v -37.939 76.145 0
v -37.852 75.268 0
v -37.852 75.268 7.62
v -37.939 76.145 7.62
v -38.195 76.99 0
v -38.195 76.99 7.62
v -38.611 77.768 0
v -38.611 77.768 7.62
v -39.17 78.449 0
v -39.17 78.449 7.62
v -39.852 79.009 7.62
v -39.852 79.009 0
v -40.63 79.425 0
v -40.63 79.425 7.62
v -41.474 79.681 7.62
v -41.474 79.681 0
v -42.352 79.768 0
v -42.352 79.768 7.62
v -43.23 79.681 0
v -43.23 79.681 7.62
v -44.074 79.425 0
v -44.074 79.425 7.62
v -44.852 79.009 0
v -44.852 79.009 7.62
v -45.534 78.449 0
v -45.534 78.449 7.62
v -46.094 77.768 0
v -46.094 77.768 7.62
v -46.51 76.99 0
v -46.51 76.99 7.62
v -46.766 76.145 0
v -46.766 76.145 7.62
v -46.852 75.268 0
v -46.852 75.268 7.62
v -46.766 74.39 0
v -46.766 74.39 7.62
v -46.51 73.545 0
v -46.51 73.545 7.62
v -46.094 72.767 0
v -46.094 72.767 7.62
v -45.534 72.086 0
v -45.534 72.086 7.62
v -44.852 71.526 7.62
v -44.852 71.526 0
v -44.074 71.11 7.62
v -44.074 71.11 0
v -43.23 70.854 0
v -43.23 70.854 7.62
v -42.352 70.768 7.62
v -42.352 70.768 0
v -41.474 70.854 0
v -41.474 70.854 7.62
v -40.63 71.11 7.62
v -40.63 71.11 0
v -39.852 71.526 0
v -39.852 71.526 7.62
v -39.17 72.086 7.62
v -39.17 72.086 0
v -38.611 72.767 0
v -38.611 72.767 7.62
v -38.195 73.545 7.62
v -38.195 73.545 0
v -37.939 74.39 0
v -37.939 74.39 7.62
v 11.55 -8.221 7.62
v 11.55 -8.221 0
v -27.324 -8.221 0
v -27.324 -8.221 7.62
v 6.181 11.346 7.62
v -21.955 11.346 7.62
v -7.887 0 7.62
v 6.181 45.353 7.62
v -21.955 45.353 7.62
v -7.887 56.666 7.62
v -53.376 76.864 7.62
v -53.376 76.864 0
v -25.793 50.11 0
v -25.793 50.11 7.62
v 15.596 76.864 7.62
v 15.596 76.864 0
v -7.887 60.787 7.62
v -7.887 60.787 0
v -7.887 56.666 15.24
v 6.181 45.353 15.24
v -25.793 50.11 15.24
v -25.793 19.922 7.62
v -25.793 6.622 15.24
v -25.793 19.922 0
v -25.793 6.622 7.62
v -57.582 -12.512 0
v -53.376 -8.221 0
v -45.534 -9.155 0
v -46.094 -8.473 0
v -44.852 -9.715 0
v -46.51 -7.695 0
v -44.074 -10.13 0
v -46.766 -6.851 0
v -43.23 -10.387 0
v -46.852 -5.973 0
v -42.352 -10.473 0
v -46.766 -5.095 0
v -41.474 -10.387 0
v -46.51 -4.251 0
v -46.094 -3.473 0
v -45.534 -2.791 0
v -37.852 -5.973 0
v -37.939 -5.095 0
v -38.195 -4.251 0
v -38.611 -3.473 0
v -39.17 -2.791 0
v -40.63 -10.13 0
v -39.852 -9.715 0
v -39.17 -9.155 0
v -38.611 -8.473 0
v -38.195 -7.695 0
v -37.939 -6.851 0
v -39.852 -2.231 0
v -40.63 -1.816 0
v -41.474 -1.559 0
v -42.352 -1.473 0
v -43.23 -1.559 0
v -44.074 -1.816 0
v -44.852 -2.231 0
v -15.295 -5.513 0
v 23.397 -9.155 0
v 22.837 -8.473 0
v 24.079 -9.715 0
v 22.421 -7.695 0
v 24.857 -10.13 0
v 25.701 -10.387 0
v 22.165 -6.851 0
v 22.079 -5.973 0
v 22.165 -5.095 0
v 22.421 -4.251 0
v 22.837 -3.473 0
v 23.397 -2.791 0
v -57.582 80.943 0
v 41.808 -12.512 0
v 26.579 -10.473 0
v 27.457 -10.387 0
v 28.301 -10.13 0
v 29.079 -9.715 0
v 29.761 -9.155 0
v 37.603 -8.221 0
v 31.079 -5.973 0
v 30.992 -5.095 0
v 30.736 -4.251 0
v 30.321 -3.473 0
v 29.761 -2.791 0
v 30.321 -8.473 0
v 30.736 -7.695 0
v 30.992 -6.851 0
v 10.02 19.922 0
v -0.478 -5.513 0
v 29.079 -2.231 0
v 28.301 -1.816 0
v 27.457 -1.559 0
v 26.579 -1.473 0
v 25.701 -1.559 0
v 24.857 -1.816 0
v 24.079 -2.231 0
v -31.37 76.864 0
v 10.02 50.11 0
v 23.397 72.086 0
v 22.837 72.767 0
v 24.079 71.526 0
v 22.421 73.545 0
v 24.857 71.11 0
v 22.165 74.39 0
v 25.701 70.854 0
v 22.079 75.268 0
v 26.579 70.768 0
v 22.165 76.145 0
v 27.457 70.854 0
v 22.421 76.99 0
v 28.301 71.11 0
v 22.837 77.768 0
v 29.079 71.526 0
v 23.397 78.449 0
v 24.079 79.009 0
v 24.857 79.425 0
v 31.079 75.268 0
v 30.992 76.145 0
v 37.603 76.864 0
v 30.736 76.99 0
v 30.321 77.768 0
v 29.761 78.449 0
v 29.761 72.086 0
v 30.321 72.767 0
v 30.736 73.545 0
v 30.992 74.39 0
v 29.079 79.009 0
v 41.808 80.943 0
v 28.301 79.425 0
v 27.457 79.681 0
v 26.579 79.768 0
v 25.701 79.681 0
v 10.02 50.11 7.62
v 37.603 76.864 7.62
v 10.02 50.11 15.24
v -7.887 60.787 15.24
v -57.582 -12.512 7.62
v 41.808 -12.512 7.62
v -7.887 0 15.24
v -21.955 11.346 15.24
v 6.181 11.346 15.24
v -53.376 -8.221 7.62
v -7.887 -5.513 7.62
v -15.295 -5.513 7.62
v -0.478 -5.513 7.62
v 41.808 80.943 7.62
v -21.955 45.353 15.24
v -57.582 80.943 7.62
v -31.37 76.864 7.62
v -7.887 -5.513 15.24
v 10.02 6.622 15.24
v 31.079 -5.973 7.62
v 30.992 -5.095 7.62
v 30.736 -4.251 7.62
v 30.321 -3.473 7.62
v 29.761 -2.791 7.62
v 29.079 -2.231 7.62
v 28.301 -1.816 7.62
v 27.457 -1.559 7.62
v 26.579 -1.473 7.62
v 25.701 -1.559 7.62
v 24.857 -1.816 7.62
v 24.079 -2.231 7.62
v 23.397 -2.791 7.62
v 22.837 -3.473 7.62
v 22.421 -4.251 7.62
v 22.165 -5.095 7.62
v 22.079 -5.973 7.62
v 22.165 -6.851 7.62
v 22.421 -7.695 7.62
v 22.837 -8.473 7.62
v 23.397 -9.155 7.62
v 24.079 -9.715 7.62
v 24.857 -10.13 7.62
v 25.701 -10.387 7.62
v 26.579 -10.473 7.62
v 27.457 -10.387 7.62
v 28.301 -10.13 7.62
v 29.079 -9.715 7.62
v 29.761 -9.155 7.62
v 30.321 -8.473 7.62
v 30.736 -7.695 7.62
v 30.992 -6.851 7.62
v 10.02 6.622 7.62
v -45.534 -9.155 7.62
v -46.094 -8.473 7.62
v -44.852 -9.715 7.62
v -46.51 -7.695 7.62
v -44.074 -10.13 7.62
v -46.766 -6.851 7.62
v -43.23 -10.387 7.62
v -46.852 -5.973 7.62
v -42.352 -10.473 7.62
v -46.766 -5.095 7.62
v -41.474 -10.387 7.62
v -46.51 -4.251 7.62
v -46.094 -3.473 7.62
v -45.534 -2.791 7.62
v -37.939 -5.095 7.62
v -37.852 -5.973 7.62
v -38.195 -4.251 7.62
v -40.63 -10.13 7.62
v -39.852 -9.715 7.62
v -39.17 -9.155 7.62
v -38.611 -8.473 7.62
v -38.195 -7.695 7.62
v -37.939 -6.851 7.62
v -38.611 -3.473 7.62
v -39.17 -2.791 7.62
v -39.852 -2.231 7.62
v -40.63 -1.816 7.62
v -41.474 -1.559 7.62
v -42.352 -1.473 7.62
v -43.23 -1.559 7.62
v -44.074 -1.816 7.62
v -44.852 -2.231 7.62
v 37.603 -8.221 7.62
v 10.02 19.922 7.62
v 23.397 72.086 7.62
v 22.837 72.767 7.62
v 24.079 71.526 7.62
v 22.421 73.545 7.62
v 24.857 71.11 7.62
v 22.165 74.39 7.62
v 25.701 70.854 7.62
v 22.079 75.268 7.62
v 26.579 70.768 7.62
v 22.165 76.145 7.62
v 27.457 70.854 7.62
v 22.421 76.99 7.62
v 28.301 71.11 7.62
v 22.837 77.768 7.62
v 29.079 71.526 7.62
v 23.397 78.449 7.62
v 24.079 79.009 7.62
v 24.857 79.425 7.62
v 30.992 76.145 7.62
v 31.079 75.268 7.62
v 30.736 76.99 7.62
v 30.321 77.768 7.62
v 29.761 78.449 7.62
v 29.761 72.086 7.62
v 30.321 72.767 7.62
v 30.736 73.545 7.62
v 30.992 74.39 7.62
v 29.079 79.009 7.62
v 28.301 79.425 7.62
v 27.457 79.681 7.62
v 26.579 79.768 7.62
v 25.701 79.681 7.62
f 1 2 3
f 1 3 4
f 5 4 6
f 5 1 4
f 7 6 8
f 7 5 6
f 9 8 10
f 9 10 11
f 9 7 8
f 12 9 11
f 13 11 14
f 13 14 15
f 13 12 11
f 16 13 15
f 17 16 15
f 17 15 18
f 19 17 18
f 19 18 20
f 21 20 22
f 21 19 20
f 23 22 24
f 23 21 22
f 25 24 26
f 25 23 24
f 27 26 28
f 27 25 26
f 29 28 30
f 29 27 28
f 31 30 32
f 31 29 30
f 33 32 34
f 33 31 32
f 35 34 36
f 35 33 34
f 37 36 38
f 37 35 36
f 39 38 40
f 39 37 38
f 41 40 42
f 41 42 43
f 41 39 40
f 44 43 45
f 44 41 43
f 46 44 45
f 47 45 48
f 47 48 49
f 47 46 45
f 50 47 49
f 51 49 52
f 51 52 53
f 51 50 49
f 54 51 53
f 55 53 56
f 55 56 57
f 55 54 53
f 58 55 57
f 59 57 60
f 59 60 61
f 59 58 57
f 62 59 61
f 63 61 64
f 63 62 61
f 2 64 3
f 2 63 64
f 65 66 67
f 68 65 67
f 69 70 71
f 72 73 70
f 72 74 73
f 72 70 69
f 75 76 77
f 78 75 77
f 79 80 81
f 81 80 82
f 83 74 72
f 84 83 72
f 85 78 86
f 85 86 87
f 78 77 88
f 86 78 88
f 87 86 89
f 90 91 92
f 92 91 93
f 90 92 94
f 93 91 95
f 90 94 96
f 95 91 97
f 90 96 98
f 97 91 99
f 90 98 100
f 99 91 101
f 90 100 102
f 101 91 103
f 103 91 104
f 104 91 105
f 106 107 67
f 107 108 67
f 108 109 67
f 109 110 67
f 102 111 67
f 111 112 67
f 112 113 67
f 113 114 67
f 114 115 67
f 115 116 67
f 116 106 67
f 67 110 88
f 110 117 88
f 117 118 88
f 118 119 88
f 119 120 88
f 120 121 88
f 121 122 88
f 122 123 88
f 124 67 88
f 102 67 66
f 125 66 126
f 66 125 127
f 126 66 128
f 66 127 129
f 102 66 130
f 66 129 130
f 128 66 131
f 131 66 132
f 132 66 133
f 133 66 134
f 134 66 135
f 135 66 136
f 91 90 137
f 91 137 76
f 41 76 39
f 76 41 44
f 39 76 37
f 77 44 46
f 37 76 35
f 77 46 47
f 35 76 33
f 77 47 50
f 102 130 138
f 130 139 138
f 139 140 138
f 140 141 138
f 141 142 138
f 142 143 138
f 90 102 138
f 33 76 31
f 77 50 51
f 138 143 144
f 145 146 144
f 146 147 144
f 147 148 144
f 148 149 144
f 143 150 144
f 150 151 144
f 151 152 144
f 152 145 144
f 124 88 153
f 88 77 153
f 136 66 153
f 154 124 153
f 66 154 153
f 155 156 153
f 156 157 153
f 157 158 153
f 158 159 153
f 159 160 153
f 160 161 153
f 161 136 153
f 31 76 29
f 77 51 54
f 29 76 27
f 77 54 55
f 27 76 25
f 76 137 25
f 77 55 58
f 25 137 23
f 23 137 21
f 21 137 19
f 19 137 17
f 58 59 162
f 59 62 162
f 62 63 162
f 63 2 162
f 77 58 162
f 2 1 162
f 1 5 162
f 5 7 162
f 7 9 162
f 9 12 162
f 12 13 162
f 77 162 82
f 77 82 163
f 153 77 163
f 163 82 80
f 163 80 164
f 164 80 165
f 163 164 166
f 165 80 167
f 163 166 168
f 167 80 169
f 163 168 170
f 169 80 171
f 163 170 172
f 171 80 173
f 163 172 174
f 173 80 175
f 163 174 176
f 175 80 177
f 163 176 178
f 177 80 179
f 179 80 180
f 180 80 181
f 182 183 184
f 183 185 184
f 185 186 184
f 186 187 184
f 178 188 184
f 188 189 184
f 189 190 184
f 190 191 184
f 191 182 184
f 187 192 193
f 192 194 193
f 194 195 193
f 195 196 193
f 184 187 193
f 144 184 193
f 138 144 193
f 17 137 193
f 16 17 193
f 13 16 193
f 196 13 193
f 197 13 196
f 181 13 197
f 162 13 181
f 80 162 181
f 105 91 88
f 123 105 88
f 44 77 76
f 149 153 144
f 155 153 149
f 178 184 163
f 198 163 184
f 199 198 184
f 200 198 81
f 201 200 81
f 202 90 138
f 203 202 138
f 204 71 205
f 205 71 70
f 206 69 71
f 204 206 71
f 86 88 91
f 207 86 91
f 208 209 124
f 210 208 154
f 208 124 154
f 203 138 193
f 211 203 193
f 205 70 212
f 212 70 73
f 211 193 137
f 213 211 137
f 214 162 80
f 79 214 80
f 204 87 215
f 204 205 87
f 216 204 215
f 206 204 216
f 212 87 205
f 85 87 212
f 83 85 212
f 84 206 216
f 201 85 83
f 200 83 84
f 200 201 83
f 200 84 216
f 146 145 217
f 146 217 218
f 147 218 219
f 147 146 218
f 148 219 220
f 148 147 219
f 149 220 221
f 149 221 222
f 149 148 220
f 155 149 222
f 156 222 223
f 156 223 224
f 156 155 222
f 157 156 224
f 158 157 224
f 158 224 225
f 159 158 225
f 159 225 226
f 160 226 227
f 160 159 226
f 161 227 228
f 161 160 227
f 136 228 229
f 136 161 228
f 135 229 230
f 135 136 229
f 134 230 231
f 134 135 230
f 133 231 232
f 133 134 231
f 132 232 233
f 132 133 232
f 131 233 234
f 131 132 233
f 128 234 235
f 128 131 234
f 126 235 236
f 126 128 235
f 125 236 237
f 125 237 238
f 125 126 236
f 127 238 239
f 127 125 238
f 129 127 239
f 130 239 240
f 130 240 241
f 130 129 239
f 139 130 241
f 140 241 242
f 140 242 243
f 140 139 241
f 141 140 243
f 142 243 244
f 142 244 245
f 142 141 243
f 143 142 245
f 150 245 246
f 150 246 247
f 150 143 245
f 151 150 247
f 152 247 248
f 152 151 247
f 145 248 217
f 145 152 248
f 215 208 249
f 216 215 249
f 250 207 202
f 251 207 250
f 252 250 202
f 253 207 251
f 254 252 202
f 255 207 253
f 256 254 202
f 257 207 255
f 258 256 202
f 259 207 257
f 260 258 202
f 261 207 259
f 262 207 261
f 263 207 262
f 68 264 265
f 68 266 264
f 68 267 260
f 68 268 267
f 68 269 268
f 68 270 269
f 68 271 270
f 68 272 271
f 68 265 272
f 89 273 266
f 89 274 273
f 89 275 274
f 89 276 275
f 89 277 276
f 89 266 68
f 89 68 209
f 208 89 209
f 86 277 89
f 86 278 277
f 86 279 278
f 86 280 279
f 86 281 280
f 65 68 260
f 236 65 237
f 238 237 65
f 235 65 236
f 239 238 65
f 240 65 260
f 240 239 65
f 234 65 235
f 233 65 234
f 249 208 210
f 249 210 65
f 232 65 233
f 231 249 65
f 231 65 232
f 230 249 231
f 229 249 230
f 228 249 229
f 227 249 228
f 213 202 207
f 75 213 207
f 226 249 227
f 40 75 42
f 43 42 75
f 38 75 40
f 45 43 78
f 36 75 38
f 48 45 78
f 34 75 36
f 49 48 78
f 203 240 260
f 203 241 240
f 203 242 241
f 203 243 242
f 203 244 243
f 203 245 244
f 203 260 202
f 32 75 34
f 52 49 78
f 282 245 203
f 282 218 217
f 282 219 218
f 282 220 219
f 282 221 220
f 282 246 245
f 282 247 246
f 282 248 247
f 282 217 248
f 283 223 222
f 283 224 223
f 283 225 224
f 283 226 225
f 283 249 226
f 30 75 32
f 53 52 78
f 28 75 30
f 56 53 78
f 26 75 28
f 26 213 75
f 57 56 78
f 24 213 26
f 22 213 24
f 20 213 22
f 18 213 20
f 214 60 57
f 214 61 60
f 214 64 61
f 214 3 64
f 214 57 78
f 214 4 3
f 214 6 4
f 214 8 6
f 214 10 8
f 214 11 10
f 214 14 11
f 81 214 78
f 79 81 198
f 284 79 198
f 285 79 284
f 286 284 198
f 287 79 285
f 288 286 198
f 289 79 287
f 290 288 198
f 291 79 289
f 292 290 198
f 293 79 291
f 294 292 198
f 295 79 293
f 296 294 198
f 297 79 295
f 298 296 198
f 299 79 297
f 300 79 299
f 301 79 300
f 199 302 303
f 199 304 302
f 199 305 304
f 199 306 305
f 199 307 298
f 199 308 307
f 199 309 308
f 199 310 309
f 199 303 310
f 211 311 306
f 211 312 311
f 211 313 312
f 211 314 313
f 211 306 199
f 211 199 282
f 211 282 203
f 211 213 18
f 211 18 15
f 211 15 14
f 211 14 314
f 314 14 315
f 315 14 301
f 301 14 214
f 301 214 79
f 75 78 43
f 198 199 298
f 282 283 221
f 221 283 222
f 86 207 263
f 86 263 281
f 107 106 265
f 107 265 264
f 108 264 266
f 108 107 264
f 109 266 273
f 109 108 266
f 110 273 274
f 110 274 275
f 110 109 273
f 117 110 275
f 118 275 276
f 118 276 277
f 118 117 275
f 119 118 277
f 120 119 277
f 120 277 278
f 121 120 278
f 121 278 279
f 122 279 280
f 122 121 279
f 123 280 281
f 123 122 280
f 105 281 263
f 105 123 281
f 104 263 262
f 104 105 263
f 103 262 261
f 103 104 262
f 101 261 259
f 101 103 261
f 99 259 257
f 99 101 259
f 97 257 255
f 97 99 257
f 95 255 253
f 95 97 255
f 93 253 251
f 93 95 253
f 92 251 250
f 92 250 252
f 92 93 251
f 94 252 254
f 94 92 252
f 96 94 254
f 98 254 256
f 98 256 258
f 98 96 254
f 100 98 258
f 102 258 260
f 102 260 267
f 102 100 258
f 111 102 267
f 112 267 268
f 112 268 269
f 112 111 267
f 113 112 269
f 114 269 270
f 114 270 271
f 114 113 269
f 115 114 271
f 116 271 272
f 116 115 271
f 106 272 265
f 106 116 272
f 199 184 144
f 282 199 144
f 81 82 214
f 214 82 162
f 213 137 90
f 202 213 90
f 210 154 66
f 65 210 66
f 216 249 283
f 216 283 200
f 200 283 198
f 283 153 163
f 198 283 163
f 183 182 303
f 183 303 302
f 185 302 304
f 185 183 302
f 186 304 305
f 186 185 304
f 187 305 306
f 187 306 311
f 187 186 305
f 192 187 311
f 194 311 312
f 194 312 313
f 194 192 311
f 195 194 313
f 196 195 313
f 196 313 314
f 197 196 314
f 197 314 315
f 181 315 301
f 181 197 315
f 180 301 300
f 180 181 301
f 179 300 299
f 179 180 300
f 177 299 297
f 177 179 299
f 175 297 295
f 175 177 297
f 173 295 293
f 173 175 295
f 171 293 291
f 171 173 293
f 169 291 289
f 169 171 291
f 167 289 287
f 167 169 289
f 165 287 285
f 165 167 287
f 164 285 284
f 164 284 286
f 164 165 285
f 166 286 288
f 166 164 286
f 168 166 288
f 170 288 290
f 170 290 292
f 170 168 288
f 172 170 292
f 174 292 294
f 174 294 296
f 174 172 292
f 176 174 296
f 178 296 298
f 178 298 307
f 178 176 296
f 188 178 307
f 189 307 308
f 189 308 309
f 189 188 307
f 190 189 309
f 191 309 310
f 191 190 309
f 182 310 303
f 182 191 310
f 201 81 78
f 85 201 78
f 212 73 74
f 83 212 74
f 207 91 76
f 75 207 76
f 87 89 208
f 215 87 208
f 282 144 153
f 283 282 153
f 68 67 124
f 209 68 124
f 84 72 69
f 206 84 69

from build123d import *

# Parameters (mm, degrees)
F0_R     = 4.5
F1_DEPTH = 7.62
F3_DEPTH = 7.62


with BuildPart() as f1:
    # F0 (on Top) → F1 (new body)
    with BuildSketch(Plane.XY):
        Polygon((-46.3863605133, -12.5119441933), (30.6131504527, -12.5119441933), (41.8083587594, -12.5119441933), (41.8083587594, 80.9429615394), (21.555083004, 80.9429615394), (-37.3282930646, 80.9429615394), (-57.58156882, 80.9429615394), (-57.58156882, -12.5119441933), align=None)
        with Locations((-42.3521250486, -5.9729921632)):
            Circle(F0_R, mode=Mode.SUBTRACT)
        Polygon((-27.3236659841, -8.2207562408), (-15.2949382399, -5.5129789378), (-0.4782718207, -5.5129789378), (11.5504559235, -8.2207562408), align=None, mode=Mode.SUBTRACT)
        with Locations((26.578914988, -5.9729921632)):
            Circle(F0_R, mode=Mode.SUBTRACT)
        Polygon((-25.793466622, 41.4102652967), (-25.793466622, 19.9220313867), (-53.3758333607, -8.2207562408), (-53.3758333607, 76.8635385285), (-25.793466622, 50.1095634738), align=None, mode=Mode.SUBTRACT)
        with Locations((-42.3521250486, 75.2675160766)):
            Circle(F0_R, mode=Mode.SUBTRACT)
        Polygon((-31.369628484, 76.8635385285), (15.5964184234, 76.8635385285), (-7.8866050303, 60.7865828711), align=None, mode=Mode.SUBTRACT)
        Polygon((37.6026233001, -8.2207562408), (10.0202565614, 19.9220313867), (10.0202565614, 41.4102652967), (10.0202565614, 50.1095634738), (37.6026233001, 76.8635385285), align=None, mode=Mode.SUBTRACT)
        with Locations((26.578914988, 75.2675160766)):
            Circle(F0_R, mode=Mode.SUBTRACT)
    extrude(amount=F1_DEPTH)

    # F2 (on face) → F3 (join)
    with BuildSketch(Plane.XY.offset(7.62)):
        Polygon((-7.8866050303, 60.7865828711), (-25.793466622, 50.1095634738), (-25.793466622, 19.9220313867), (-25.793466622, 6.6224359907), (-7.8866050303, -5.5129789378), (10.0202565614, 6.6224359907), (10.0202565614, 19.9220313867), (10.0202565614, 50.1095634738), align=None)
        Polygon((-21.9546725898, 45.3533753753), (-7.8866050303, 56.6663203104), (6.1814625292, 45.3533753753), (6.1814625292, 11.3457208499), (-7.8866050303, 0), (-21.9546725898, 11.3457208499), align=None, mode=Mode.SUBTRACT)
    extrude(amount=F3_DEPTH)


solid = f1.part
